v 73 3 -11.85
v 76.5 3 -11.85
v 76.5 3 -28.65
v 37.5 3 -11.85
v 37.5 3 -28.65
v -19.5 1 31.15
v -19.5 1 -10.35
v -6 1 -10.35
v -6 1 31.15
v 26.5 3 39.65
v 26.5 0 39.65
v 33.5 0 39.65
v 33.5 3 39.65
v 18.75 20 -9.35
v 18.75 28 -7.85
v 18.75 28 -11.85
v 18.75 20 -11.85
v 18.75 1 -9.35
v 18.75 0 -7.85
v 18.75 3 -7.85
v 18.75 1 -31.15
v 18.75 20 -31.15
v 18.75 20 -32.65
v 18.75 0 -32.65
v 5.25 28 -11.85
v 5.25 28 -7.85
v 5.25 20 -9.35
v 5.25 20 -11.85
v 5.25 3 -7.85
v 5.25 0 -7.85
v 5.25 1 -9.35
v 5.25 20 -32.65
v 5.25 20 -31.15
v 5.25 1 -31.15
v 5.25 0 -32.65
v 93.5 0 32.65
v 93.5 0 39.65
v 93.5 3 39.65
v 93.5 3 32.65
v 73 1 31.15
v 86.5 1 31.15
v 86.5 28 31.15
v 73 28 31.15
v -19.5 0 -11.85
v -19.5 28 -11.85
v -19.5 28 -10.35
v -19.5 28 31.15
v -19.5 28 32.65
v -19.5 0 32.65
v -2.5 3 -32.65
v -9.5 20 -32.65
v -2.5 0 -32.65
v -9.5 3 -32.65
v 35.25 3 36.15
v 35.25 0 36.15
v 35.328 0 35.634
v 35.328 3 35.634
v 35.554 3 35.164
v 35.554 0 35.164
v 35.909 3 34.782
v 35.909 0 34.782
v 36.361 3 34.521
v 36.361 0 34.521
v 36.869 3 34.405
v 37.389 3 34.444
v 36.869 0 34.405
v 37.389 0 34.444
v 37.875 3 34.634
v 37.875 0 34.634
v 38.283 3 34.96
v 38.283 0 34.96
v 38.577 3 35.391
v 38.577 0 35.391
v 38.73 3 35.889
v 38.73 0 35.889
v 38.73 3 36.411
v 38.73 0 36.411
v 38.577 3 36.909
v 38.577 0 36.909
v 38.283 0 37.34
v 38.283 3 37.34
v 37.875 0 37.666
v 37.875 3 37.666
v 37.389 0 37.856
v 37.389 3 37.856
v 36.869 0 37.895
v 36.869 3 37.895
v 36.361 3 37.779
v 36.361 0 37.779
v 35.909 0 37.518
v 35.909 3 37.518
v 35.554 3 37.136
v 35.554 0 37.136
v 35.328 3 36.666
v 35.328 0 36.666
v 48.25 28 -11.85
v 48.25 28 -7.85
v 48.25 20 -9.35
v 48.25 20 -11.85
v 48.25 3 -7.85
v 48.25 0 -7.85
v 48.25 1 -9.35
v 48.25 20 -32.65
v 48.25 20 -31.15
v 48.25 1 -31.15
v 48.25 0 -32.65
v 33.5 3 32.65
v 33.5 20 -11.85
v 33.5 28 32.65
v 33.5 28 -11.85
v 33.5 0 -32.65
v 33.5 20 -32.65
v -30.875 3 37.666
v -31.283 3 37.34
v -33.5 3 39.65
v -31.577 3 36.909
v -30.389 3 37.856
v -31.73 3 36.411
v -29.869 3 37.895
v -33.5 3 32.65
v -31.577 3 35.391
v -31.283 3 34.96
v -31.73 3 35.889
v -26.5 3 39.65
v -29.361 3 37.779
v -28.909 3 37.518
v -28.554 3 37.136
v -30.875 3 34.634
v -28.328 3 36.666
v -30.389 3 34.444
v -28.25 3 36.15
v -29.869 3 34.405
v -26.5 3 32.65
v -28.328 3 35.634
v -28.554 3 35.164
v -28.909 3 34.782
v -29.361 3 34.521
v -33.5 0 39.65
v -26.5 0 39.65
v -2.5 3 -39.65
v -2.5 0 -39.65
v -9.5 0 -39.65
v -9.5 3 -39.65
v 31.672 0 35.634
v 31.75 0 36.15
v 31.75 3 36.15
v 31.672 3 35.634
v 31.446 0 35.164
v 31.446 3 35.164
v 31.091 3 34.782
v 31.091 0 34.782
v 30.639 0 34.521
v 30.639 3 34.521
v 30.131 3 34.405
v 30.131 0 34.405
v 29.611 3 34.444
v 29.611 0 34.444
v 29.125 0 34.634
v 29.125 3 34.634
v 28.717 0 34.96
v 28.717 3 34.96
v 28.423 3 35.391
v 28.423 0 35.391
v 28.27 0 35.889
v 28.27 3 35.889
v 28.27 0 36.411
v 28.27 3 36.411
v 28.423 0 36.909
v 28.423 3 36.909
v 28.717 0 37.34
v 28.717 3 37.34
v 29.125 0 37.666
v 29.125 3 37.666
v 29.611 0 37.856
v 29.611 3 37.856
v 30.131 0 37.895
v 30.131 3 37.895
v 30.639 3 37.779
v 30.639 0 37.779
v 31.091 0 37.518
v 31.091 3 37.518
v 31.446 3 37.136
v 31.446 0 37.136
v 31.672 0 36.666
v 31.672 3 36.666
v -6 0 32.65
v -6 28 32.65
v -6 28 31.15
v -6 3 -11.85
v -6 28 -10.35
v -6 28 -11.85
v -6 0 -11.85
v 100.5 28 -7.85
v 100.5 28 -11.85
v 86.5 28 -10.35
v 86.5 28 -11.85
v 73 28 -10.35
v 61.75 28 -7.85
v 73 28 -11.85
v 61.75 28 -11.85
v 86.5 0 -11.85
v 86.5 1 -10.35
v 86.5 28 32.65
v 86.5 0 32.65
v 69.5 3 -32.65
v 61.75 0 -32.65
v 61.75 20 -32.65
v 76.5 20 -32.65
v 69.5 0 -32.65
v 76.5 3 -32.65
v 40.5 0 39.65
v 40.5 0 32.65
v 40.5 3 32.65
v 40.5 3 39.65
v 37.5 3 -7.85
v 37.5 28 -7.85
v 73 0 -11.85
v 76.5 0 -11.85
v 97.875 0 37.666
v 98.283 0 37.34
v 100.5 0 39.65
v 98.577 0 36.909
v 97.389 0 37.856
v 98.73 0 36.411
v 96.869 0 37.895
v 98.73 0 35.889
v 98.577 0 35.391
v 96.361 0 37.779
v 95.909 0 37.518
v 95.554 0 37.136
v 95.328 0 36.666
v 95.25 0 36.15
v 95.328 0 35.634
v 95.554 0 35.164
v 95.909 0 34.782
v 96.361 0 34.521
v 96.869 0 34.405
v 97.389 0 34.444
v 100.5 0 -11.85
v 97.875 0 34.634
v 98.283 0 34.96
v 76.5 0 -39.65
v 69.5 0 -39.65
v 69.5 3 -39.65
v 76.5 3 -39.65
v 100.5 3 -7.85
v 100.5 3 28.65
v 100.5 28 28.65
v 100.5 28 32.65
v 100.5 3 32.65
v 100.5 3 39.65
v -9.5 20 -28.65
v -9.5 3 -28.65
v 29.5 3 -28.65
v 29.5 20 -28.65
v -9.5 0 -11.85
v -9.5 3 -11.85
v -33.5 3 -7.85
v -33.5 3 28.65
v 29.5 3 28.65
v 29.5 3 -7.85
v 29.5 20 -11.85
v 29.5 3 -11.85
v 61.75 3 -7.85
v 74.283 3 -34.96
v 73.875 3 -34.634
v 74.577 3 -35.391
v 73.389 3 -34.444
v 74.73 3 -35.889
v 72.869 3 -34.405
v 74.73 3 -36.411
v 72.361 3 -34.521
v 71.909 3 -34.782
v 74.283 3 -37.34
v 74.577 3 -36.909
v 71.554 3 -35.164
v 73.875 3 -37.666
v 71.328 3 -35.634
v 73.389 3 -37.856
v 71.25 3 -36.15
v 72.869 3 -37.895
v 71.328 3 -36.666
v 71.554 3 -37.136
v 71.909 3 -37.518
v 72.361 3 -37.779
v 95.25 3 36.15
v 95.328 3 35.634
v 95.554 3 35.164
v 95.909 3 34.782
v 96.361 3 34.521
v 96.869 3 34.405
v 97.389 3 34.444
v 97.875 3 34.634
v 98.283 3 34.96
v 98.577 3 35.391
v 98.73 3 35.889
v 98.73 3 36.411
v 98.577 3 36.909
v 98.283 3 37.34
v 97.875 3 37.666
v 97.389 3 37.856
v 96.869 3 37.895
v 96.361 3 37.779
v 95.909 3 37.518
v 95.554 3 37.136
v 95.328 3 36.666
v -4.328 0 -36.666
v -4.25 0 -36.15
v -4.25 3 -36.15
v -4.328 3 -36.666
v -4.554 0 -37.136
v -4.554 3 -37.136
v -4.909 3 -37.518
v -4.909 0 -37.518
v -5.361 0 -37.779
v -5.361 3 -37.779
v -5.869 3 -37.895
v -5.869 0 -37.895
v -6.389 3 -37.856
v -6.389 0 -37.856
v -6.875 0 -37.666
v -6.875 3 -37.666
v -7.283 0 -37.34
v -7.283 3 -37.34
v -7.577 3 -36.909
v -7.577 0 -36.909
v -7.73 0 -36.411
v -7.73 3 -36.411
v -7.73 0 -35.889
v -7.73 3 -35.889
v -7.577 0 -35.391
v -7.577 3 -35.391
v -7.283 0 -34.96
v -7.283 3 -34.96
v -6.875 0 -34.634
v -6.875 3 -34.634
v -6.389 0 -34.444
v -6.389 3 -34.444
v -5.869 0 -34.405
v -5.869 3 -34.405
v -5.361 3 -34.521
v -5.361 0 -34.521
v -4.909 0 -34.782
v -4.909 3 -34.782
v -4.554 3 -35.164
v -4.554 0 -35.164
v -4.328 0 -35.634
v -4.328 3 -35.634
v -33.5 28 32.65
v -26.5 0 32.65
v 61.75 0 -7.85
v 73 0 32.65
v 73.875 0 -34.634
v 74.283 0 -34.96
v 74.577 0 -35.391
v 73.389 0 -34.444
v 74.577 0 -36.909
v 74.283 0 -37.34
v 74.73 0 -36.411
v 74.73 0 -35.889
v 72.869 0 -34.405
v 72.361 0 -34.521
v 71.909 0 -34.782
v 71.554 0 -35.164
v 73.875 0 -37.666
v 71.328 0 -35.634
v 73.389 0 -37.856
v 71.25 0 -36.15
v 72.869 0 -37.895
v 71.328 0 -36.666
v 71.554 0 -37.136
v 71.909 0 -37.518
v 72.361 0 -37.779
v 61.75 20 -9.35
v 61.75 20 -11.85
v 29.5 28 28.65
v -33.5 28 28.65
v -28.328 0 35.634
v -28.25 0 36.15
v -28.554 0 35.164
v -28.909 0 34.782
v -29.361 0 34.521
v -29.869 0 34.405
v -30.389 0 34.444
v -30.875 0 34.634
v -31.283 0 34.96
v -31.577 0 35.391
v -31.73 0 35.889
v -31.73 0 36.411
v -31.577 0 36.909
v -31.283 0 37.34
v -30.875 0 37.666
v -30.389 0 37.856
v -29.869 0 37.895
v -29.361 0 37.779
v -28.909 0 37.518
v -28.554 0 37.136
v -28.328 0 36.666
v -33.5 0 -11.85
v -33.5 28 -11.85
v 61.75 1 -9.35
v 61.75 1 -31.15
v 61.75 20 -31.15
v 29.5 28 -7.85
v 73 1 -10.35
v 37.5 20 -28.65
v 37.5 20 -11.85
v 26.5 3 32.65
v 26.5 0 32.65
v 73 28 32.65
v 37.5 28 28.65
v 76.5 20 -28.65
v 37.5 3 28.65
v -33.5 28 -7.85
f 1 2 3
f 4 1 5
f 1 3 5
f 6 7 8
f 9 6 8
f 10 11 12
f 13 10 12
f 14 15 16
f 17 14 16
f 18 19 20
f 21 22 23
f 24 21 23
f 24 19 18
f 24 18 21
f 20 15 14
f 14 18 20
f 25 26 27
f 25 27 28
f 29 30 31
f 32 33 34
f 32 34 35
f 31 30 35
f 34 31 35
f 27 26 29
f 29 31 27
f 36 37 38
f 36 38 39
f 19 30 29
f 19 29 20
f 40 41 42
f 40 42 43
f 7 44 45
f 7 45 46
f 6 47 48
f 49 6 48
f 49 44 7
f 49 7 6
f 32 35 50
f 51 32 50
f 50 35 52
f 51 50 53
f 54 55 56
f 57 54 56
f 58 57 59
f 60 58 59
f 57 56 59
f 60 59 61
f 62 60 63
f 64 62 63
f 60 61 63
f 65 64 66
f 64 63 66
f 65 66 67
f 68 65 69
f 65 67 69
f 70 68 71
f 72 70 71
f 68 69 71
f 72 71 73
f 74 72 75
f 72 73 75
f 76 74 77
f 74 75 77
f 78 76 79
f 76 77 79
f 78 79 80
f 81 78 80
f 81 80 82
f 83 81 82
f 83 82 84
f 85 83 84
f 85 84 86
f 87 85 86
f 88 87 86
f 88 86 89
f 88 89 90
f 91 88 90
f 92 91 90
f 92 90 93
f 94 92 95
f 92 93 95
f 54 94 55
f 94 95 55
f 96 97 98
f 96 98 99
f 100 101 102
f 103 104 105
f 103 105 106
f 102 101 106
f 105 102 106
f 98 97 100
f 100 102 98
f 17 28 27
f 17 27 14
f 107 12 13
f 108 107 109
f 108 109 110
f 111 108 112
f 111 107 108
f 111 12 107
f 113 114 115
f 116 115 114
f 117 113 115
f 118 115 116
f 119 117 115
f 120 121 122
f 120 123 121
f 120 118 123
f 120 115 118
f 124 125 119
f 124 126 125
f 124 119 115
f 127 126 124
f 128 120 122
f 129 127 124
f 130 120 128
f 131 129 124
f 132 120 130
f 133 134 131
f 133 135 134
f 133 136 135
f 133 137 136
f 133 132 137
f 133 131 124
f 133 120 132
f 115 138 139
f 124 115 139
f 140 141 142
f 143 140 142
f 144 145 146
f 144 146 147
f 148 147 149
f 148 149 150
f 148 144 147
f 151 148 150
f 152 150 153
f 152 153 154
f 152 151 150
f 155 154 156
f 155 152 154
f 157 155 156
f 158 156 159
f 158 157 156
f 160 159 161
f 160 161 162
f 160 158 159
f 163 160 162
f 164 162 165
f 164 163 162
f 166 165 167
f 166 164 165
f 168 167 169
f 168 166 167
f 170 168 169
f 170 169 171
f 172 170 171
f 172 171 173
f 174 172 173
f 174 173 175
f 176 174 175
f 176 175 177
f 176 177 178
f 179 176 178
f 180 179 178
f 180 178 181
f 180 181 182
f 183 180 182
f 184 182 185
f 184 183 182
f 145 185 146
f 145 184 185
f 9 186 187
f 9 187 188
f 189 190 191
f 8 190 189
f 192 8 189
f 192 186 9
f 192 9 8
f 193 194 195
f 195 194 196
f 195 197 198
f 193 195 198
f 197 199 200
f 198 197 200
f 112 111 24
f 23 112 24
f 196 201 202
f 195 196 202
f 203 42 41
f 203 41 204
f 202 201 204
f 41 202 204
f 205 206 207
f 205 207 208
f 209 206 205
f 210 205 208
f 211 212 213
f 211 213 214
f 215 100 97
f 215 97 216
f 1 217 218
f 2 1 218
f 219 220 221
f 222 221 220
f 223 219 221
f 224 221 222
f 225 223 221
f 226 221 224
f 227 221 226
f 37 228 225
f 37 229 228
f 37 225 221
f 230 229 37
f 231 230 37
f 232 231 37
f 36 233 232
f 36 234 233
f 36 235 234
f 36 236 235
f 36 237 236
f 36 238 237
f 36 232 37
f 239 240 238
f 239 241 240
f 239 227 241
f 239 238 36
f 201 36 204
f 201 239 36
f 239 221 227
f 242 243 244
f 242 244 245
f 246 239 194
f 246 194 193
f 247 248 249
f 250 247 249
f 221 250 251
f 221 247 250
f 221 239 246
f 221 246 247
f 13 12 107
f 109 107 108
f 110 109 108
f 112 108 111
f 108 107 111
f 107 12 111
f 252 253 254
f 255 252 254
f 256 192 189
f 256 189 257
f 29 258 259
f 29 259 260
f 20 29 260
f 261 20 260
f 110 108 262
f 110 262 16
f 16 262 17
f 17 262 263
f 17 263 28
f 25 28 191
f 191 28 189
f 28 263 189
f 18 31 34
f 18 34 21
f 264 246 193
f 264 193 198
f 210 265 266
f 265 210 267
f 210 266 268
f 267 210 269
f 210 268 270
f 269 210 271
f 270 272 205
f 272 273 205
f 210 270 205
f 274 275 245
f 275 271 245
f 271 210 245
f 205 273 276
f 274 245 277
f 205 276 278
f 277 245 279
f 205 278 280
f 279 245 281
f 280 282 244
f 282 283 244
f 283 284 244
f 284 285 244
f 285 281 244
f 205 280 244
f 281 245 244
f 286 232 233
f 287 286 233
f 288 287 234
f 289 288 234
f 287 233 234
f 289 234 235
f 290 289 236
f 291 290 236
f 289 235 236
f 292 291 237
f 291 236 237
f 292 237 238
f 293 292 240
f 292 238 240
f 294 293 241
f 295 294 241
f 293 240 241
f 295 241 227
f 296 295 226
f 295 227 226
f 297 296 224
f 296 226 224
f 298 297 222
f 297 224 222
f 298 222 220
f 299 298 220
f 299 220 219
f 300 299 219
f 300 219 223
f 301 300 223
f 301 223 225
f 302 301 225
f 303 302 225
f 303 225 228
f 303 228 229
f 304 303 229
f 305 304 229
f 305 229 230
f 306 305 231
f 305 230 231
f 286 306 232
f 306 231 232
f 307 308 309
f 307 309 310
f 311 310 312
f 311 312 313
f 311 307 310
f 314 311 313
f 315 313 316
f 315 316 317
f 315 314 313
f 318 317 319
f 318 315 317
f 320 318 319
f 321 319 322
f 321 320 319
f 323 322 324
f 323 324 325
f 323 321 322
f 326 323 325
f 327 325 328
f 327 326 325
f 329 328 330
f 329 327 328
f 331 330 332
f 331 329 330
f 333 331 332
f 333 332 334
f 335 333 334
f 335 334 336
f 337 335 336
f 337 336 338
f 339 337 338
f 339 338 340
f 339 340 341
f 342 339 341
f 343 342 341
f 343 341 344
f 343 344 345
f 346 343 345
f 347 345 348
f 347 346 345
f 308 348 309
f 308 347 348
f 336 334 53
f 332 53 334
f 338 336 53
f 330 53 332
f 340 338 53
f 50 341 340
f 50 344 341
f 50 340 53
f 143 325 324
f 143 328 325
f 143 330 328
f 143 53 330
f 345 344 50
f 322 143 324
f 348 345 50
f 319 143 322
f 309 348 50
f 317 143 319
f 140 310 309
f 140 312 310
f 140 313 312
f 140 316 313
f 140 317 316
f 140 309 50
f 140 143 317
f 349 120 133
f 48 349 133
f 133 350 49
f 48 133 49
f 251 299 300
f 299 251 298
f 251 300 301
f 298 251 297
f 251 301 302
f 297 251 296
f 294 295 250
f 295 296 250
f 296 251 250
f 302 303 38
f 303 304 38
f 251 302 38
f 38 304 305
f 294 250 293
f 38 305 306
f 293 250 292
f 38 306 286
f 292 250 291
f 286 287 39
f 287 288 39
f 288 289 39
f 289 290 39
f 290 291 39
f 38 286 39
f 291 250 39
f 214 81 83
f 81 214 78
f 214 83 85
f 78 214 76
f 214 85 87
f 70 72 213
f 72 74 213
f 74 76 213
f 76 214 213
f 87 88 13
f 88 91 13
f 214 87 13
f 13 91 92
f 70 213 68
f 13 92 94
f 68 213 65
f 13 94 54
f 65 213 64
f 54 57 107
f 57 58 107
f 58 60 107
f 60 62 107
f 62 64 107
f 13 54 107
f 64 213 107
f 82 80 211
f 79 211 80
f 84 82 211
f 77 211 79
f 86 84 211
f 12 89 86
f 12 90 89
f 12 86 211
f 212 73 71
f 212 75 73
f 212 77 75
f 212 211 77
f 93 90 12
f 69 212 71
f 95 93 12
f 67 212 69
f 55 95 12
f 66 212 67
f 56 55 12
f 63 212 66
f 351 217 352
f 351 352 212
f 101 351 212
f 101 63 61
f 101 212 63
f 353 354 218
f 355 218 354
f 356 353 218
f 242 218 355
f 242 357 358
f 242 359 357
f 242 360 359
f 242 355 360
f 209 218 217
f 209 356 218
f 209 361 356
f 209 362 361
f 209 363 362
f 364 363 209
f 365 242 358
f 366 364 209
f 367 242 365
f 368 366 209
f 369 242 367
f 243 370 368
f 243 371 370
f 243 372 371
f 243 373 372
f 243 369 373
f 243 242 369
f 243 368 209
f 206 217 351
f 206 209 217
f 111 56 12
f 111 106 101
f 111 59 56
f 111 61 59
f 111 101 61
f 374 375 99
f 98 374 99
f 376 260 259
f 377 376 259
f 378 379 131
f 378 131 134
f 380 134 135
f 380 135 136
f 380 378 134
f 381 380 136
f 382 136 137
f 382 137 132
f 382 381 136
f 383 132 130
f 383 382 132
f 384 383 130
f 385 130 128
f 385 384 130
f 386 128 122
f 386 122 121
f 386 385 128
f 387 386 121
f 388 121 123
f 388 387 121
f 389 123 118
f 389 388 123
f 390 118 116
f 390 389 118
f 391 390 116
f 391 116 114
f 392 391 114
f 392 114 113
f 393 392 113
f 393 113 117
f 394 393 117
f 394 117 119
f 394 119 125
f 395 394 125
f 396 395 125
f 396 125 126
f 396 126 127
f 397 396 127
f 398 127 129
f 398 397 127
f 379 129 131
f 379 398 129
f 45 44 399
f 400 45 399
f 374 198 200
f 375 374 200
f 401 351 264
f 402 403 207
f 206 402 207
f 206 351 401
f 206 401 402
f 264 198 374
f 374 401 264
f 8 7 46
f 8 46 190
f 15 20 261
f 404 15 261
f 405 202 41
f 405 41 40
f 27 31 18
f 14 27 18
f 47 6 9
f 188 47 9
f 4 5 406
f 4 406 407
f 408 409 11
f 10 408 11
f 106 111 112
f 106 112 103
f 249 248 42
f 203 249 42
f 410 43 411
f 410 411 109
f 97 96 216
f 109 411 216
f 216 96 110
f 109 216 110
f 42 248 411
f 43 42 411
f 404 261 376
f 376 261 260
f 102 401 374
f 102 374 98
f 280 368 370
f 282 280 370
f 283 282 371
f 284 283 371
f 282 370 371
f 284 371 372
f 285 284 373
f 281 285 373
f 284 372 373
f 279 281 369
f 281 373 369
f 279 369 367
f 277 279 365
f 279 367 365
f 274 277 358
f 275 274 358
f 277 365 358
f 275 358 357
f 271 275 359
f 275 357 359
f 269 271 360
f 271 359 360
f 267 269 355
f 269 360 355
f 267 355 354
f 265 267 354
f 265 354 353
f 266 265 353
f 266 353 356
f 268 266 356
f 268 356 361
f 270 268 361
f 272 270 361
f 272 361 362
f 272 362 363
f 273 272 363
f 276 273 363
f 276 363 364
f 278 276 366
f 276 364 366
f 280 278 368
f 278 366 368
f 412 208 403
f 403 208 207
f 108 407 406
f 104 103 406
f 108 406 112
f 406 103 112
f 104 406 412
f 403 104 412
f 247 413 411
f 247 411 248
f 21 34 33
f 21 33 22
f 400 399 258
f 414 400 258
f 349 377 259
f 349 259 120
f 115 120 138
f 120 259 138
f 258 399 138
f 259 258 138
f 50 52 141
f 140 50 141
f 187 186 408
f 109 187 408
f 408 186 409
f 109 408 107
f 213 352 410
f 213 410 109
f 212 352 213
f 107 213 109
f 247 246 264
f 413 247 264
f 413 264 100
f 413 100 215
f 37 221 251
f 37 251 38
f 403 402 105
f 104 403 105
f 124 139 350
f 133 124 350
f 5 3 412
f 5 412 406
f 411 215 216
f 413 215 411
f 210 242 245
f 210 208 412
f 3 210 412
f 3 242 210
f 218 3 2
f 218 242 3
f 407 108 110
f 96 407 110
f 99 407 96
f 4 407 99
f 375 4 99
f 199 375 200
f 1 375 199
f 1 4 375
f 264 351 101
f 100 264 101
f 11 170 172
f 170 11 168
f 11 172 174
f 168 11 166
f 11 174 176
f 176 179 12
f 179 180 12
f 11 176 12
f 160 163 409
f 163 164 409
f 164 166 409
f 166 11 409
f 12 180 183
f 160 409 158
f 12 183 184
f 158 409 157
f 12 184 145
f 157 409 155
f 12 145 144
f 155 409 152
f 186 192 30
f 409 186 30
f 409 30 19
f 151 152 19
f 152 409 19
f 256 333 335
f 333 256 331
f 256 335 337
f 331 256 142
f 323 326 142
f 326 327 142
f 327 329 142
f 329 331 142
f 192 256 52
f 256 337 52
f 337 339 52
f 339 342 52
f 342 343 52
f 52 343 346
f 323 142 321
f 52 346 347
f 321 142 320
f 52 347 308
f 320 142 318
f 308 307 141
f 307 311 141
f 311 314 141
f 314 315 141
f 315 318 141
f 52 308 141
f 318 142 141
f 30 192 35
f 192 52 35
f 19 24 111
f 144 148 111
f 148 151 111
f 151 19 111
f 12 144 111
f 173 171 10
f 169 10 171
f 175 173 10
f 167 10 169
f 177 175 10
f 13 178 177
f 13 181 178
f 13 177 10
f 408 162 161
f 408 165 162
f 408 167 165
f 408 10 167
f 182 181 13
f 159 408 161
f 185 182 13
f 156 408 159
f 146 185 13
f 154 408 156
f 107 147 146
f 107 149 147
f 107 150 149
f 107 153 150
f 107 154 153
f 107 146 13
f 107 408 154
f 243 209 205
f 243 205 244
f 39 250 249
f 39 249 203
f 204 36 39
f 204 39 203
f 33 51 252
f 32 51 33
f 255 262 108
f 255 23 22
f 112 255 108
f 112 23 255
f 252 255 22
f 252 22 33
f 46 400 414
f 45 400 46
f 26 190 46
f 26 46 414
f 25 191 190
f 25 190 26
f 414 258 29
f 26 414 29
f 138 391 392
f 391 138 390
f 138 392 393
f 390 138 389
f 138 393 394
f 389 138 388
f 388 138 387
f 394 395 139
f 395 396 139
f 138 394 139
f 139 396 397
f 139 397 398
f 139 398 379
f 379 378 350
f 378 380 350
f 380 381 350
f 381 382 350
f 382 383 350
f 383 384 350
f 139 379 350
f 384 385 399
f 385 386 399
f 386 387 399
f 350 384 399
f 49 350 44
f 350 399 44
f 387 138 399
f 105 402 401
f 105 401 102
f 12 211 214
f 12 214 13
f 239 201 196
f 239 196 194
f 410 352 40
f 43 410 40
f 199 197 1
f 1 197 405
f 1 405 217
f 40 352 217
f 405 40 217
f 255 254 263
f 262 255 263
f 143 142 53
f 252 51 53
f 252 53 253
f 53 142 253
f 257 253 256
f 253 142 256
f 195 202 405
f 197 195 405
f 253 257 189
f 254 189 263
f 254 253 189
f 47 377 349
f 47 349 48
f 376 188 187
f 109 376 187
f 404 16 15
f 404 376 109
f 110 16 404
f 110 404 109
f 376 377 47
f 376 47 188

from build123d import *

# Parameters (mm, degrees)
SKETCH1_R               = 1.75
BOSS_EXTRUDE1_DEPTH     = 3
BOSS_EXTRUDE2_START     = 3
SKETCH1_5_W             = 13.5
SKETCH1_5_H             = 2.5
BOSS_EXTRUDE2_DEPTH     = 25
SKETCH1_6_W             = 13.5
SKETCH1_6_H             = 2.5
BOSS_EXTRUDE3_DEPTH     = 20
SKETCH1_7_W             = 13.5
SKETCH1_7_H             = 1.5
CUT_EXTRUDE1_DEPTH      = 29
CUT_EXTRUDE1_DEPTH_BACK = 1
SKETCH1_8_W             = 13.5
SKETCH1_8_H             = 16.8
SKETCH1_8_H_2           = 2.5
SKETCH1_8_H_3           = 36.5
CUT_EXTRUDE2_DEPTH      = 1


with BuildPart() as part:
    # Sketch1 → Boss-Extrude1 (new body)
    with BuildSketch(Plane(origin=(0, 0, 0), x_dir=(1, 0, 0), z_dir=(0, 1, 0))):
        Polygon((-33.5, 11.85), (-33.5, -39.65), (-26.5, -39.65), (-26.5, -32.65), (26.5, -32.65), (26.5, -39.65), (33.5, -39.65), (33.5, 32.65), (-2.5, 32.65), (-2.5, 39.65), (-9.5, 39.65), (-9.5, 11.85), align=None)
        with Locations((-30, -36.15)):
            Circle(SKETCH1_R, mode=Mode.SUBTRACT)
        with Locations((30, -36.15)):
            Circle(SKETCH1_R, mode=Mode.SUBTRACT)
        with Locations((-6, 36.15)):
            Circle(SKETCH1_R, mode=Mode.SUBTRACT)
    extrude(amount=BOSS_EXTRUDE1_DEPTH)

    # Sketch1<5> → Boss-Extrude2 (add)
    with BuildSketch(Plane(origin=(0, 0, 0), x_dir=(1, 0, 0), z_dir=(0, 1, 0)).offset(BOSS_EXTRUDE2_START)):
        Polygon((-19.5, -31.15), (-19.5, -28.65), (-33.5, -28.65), (-33.5, -32.65), (-26.5, -32.65), (-19.5, -32.65), align=None)
        with Locations((-12.75, -29.9)):
            Rectangle(SKETCH1_5_W, SKETCH1_5_H)
        Polygon((18.75, 9.35), (18.75, 7.85), (29.5, 7.85), (29.5, -28.65), (-6, -28.65), (-6, -31.15), (-6, -32.65), (26.5, -32.65), (33.5, -32.65), (33.5, 11.85), (29.5, 11.85), (18.75, 11.85), align=None)
        Polygon((-6, 7.85), (5.25, 7.85), (5.25, 9.35), (5.25, 11.85), (-6, 11.85), (-6, 10.35), align=None)
        with Locations((-12.75, 9.1)):
            Rectangle(SKETCH1_5_W, SKETCH1_5_H)
        Polygon((-33.5, 7.85), (-19.5, 7.85), (-19.5, 10.35), (-19.5, 11.85), (-33.5, 11.85), align=None)
    extrude(amount=BOSS_EXTRUDE2_DEPTH)

    # Sketch1<6> → Boss-Extrude3 (add)
    with BuildSketch(Plane(origin=(0, 0, 0), x_dir=(1, 0, 0), z_dir=(0, 1, 0))):
        Polygon((29.5, 28.65), (29.5, 11.85), (33.5, 11.85), (33.5, 32.65), (18.75, 32.65), (18.75, 31.15), (18.75, 28.65), align=None)
        Polygon((-9.5, 28.65), (5.25, 28.65), (5.25, 31.15), (5.25, 32.65), (-2.5, 32.65), (-9.5, 32.65), align=None)
        with Locations((12, 29.9)):
            Rectangle(SKETCH1_6_W, SKETCH1_6_H)
        with Locations((12, 10.6)):
            Rectangle(SKETCH1_6_W, SKETCH1_6_H)
    extrude(amount=BOSS_EXTRUDE3_DEPTH)

    # Sketch1<7> → Cut-Extrude1 (cut, two sides)
    with BuildSketch(Plane(origin=(0, 0, 0), x_dir=(1, 0, 0), z_dir=(0, 1, 0))) as cut_extrude1_sk:
        with Locations((12, 31.9)):
            Rectangle(SKETCH1_7_W, SKETCH1_7_H)
        with Locations((12, 8.6)):
            Rectangle(SKETCH1_7_W, SKETCH1_7_H)
        Polygon((-19.5, 10.35), (-6, 10.35), (-6, 11.85), (-9.5, 11.85), (-19.5, 11.85), align=None)
        with Locations((-12.75, -31.9)):
            Rectangle(SKETCH1_7_W, SKETCH1_7_H)
    extrude(amount=CUT_EXTRUDE1_DEPTH, mode=Mode.SUBTRACT)
    extrude(cut_extrude1_sk.sketch, amount=-CUT_EXTRUDE1_DEPTH_BACK, mode=Mode.SUBTRACT)

    # Sketch1<8> → Cut-Extrude2 (cut)
    with BuildSketch(Plane(origin=(0, 0, 0), x_dir=(1, 0, 0), z_dir=(0, 1, 0))):
        with Locations((12, 20.25)):
            Rectangle(SKETCH1_8_W, SKETCH1_8_H)
        with Locations((12, 29.9)):
            Rectangle(SKETCH1_8_W, SKETCH1_8_H_2)
        with Locations((12, 10.6)):
            Rectangle(SKETCH1_8_W, SKETCH1_8_H_2)
        with Locations((-12.75, -10.4)):
            Rectangle(SKETCH1_8_W, SKETCH1_8_H_3)
        with Locations((-12.75, 9.1)):
            Rectangle(SKETCH1_8_W, SKETCH1_8_H_2)
        with Locations((-12.75, -29.9)):
            Rectangle(SKETCH1_8_W, SKETCH1_8_H_2)
    extrude(amount=CUT_EXTRUDE2_DEPTH, mode=Mode.SUBTRACT)


with BuildPart() as body_2:
    # Mirror1: mirrored copy
    add(part.part.mirror(Plane(origin=(33.5, 3, 0), x_dir=(0, 0, 1), z_dir=(-1, 0, 0))))


solid = Compound([part.part, body_2.part])
